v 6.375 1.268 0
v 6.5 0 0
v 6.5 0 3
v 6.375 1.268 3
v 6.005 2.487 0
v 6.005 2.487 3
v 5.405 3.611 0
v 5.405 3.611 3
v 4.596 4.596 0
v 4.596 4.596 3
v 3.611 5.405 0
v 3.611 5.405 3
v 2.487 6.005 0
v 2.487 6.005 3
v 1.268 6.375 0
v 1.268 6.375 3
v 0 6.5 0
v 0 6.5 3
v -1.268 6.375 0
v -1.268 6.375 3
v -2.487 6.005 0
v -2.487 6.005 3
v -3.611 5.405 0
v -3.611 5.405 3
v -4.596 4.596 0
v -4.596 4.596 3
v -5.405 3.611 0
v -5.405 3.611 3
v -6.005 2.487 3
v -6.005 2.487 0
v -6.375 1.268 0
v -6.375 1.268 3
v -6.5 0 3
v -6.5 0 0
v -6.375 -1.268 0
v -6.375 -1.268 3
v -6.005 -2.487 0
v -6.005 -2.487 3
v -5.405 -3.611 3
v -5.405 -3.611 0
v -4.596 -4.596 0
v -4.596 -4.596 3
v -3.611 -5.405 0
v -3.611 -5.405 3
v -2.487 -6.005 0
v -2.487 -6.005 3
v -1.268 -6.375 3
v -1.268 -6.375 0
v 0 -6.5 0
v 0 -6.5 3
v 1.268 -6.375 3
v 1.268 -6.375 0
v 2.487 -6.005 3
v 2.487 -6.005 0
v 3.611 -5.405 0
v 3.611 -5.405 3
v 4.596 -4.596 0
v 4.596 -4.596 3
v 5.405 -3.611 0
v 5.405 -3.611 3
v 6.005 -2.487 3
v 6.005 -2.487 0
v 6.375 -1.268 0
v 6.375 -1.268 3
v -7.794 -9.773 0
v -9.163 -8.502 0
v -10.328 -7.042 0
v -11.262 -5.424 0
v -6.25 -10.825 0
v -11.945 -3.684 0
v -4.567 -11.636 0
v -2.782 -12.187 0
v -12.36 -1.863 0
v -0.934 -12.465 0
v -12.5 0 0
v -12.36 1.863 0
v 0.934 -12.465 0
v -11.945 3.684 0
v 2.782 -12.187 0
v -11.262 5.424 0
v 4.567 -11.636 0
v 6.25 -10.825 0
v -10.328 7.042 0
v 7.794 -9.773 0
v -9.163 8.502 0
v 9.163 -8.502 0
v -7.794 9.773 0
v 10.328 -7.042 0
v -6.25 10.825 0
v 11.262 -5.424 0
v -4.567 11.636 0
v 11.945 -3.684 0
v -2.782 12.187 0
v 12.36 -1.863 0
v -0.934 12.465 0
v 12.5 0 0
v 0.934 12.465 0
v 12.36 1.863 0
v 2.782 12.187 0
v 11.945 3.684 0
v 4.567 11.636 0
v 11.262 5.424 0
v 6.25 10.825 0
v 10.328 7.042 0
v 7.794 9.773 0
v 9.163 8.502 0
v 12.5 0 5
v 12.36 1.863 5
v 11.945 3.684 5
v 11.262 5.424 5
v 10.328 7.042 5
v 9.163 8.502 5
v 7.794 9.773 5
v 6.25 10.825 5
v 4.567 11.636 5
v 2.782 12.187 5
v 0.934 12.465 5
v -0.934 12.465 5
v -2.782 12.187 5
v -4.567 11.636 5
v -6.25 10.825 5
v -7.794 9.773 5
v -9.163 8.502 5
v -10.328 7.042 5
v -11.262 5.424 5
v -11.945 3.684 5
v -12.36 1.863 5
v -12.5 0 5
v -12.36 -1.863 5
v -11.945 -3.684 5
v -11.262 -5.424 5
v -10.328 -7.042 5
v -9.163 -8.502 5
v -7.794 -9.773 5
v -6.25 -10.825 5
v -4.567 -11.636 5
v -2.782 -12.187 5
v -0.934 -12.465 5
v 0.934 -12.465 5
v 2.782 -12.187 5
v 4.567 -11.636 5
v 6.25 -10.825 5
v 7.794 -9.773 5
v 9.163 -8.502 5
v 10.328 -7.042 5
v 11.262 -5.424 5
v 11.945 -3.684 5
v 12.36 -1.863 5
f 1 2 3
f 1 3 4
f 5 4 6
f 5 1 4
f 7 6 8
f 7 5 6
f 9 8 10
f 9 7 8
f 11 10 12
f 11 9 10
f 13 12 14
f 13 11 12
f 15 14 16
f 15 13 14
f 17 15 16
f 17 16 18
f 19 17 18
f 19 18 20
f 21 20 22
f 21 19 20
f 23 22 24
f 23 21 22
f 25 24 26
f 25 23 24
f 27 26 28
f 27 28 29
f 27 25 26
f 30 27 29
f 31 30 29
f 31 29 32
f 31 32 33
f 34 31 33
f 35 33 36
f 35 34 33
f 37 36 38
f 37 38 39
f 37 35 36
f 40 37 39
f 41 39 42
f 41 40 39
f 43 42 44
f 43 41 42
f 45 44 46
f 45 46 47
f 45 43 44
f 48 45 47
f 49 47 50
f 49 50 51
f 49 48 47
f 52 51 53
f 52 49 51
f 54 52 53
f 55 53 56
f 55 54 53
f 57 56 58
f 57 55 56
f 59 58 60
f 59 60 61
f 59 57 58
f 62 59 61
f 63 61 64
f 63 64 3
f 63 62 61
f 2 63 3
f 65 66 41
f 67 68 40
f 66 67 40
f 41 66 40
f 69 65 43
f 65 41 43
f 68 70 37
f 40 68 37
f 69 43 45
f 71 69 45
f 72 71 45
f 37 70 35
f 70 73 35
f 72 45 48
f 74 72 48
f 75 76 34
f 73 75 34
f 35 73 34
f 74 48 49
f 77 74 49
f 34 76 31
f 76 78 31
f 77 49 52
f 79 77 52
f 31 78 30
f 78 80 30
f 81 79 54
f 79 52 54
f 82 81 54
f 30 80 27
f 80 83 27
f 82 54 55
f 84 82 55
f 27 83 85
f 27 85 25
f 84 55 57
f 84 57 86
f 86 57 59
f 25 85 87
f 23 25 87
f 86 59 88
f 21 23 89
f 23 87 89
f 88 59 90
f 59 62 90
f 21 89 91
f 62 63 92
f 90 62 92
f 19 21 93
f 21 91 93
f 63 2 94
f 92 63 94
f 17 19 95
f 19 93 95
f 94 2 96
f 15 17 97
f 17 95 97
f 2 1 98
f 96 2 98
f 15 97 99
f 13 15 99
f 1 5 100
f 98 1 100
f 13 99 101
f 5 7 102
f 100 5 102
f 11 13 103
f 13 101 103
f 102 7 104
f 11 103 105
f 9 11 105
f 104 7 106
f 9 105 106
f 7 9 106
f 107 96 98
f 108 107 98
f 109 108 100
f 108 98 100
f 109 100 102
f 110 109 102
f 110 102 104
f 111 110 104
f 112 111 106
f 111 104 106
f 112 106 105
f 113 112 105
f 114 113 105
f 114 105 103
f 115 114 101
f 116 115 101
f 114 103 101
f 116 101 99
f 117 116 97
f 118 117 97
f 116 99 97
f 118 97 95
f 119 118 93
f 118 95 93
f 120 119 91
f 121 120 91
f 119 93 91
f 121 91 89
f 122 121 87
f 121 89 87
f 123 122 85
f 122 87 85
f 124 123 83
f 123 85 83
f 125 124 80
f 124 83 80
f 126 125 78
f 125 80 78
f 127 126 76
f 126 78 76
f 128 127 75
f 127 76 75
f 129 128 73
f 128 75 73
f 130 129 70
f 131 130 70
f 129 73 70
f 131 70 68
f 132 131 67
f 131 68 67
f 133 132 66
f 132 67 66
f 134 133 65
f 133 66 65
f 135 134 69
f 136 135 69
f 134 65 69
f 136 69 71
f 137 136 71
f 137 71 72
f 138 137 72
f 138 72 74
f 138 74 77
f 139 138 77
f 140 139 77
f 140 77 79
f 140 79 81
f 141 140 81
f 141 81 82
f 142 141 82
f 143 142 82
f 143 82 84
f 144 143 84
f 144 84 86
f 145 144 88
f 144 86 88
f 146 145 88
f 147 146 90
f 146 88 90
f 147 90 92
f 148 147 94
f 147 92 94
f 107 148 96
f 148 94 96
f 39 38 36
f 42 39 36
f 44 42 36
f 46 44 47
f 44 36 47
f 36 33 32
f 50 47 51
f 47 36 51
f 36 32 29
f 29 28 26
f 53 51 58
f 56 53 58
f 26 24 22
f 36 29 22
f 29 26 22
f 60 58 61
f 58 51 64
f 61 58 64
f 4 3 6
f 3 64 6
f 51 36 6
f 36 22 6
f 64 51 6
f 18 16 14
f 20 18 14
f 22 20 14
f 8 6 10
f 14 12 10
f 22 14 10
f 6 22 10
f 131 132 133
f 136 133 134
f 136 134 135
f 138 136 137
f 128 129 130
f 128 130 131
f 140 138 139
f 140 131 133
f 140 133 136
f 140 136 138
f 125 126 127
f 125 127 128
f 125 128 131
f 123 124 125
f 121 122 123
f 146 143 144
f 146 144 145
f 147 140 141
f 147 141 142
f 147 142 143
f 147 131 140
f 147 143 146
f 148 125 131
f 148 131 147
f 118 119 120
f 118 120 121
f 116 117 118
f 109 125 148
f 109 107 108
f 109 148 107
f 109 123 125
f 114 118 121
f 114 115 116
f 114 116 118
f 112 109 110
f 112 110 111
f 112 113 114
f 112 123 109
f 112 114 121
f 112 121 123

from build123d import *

# Parameters (mm, degrees)
F0_R     = 12.5
F1_DEPTH = 5
F2_R     = 6.5
F3_DEPTH = 2.54
F4_DEPTH = 3
F5_R     = 6.5
F6_DEPTH = 3


with BuildPart() as f1:
    # F0 (on Top) → F1 (new body)
    with BuildSketch(Plane.XY):
        Circle(F0_R)
    extrude(amount=F1_DEPTH)

    # F2 (on Top) → F3 (join)
    with BuildSketch(Plane.XY):
        Circle(F2_R)
    extrude(amount=F3_DEPTH)

    # F2 (on Top) → F4 (join)
    with BuildSketch(Plane.XY):
        Circle(F2_R)
    extrude(amount=F4_DEPTH)

    # F5 (on Top) → F6 (cut)
    with BuildSketch(Plane.XY):
        Circle(F5_R)
    extrude(amount=F6_DEPTH, mode=Mode.SUBTRACT)


solid = f1.part
